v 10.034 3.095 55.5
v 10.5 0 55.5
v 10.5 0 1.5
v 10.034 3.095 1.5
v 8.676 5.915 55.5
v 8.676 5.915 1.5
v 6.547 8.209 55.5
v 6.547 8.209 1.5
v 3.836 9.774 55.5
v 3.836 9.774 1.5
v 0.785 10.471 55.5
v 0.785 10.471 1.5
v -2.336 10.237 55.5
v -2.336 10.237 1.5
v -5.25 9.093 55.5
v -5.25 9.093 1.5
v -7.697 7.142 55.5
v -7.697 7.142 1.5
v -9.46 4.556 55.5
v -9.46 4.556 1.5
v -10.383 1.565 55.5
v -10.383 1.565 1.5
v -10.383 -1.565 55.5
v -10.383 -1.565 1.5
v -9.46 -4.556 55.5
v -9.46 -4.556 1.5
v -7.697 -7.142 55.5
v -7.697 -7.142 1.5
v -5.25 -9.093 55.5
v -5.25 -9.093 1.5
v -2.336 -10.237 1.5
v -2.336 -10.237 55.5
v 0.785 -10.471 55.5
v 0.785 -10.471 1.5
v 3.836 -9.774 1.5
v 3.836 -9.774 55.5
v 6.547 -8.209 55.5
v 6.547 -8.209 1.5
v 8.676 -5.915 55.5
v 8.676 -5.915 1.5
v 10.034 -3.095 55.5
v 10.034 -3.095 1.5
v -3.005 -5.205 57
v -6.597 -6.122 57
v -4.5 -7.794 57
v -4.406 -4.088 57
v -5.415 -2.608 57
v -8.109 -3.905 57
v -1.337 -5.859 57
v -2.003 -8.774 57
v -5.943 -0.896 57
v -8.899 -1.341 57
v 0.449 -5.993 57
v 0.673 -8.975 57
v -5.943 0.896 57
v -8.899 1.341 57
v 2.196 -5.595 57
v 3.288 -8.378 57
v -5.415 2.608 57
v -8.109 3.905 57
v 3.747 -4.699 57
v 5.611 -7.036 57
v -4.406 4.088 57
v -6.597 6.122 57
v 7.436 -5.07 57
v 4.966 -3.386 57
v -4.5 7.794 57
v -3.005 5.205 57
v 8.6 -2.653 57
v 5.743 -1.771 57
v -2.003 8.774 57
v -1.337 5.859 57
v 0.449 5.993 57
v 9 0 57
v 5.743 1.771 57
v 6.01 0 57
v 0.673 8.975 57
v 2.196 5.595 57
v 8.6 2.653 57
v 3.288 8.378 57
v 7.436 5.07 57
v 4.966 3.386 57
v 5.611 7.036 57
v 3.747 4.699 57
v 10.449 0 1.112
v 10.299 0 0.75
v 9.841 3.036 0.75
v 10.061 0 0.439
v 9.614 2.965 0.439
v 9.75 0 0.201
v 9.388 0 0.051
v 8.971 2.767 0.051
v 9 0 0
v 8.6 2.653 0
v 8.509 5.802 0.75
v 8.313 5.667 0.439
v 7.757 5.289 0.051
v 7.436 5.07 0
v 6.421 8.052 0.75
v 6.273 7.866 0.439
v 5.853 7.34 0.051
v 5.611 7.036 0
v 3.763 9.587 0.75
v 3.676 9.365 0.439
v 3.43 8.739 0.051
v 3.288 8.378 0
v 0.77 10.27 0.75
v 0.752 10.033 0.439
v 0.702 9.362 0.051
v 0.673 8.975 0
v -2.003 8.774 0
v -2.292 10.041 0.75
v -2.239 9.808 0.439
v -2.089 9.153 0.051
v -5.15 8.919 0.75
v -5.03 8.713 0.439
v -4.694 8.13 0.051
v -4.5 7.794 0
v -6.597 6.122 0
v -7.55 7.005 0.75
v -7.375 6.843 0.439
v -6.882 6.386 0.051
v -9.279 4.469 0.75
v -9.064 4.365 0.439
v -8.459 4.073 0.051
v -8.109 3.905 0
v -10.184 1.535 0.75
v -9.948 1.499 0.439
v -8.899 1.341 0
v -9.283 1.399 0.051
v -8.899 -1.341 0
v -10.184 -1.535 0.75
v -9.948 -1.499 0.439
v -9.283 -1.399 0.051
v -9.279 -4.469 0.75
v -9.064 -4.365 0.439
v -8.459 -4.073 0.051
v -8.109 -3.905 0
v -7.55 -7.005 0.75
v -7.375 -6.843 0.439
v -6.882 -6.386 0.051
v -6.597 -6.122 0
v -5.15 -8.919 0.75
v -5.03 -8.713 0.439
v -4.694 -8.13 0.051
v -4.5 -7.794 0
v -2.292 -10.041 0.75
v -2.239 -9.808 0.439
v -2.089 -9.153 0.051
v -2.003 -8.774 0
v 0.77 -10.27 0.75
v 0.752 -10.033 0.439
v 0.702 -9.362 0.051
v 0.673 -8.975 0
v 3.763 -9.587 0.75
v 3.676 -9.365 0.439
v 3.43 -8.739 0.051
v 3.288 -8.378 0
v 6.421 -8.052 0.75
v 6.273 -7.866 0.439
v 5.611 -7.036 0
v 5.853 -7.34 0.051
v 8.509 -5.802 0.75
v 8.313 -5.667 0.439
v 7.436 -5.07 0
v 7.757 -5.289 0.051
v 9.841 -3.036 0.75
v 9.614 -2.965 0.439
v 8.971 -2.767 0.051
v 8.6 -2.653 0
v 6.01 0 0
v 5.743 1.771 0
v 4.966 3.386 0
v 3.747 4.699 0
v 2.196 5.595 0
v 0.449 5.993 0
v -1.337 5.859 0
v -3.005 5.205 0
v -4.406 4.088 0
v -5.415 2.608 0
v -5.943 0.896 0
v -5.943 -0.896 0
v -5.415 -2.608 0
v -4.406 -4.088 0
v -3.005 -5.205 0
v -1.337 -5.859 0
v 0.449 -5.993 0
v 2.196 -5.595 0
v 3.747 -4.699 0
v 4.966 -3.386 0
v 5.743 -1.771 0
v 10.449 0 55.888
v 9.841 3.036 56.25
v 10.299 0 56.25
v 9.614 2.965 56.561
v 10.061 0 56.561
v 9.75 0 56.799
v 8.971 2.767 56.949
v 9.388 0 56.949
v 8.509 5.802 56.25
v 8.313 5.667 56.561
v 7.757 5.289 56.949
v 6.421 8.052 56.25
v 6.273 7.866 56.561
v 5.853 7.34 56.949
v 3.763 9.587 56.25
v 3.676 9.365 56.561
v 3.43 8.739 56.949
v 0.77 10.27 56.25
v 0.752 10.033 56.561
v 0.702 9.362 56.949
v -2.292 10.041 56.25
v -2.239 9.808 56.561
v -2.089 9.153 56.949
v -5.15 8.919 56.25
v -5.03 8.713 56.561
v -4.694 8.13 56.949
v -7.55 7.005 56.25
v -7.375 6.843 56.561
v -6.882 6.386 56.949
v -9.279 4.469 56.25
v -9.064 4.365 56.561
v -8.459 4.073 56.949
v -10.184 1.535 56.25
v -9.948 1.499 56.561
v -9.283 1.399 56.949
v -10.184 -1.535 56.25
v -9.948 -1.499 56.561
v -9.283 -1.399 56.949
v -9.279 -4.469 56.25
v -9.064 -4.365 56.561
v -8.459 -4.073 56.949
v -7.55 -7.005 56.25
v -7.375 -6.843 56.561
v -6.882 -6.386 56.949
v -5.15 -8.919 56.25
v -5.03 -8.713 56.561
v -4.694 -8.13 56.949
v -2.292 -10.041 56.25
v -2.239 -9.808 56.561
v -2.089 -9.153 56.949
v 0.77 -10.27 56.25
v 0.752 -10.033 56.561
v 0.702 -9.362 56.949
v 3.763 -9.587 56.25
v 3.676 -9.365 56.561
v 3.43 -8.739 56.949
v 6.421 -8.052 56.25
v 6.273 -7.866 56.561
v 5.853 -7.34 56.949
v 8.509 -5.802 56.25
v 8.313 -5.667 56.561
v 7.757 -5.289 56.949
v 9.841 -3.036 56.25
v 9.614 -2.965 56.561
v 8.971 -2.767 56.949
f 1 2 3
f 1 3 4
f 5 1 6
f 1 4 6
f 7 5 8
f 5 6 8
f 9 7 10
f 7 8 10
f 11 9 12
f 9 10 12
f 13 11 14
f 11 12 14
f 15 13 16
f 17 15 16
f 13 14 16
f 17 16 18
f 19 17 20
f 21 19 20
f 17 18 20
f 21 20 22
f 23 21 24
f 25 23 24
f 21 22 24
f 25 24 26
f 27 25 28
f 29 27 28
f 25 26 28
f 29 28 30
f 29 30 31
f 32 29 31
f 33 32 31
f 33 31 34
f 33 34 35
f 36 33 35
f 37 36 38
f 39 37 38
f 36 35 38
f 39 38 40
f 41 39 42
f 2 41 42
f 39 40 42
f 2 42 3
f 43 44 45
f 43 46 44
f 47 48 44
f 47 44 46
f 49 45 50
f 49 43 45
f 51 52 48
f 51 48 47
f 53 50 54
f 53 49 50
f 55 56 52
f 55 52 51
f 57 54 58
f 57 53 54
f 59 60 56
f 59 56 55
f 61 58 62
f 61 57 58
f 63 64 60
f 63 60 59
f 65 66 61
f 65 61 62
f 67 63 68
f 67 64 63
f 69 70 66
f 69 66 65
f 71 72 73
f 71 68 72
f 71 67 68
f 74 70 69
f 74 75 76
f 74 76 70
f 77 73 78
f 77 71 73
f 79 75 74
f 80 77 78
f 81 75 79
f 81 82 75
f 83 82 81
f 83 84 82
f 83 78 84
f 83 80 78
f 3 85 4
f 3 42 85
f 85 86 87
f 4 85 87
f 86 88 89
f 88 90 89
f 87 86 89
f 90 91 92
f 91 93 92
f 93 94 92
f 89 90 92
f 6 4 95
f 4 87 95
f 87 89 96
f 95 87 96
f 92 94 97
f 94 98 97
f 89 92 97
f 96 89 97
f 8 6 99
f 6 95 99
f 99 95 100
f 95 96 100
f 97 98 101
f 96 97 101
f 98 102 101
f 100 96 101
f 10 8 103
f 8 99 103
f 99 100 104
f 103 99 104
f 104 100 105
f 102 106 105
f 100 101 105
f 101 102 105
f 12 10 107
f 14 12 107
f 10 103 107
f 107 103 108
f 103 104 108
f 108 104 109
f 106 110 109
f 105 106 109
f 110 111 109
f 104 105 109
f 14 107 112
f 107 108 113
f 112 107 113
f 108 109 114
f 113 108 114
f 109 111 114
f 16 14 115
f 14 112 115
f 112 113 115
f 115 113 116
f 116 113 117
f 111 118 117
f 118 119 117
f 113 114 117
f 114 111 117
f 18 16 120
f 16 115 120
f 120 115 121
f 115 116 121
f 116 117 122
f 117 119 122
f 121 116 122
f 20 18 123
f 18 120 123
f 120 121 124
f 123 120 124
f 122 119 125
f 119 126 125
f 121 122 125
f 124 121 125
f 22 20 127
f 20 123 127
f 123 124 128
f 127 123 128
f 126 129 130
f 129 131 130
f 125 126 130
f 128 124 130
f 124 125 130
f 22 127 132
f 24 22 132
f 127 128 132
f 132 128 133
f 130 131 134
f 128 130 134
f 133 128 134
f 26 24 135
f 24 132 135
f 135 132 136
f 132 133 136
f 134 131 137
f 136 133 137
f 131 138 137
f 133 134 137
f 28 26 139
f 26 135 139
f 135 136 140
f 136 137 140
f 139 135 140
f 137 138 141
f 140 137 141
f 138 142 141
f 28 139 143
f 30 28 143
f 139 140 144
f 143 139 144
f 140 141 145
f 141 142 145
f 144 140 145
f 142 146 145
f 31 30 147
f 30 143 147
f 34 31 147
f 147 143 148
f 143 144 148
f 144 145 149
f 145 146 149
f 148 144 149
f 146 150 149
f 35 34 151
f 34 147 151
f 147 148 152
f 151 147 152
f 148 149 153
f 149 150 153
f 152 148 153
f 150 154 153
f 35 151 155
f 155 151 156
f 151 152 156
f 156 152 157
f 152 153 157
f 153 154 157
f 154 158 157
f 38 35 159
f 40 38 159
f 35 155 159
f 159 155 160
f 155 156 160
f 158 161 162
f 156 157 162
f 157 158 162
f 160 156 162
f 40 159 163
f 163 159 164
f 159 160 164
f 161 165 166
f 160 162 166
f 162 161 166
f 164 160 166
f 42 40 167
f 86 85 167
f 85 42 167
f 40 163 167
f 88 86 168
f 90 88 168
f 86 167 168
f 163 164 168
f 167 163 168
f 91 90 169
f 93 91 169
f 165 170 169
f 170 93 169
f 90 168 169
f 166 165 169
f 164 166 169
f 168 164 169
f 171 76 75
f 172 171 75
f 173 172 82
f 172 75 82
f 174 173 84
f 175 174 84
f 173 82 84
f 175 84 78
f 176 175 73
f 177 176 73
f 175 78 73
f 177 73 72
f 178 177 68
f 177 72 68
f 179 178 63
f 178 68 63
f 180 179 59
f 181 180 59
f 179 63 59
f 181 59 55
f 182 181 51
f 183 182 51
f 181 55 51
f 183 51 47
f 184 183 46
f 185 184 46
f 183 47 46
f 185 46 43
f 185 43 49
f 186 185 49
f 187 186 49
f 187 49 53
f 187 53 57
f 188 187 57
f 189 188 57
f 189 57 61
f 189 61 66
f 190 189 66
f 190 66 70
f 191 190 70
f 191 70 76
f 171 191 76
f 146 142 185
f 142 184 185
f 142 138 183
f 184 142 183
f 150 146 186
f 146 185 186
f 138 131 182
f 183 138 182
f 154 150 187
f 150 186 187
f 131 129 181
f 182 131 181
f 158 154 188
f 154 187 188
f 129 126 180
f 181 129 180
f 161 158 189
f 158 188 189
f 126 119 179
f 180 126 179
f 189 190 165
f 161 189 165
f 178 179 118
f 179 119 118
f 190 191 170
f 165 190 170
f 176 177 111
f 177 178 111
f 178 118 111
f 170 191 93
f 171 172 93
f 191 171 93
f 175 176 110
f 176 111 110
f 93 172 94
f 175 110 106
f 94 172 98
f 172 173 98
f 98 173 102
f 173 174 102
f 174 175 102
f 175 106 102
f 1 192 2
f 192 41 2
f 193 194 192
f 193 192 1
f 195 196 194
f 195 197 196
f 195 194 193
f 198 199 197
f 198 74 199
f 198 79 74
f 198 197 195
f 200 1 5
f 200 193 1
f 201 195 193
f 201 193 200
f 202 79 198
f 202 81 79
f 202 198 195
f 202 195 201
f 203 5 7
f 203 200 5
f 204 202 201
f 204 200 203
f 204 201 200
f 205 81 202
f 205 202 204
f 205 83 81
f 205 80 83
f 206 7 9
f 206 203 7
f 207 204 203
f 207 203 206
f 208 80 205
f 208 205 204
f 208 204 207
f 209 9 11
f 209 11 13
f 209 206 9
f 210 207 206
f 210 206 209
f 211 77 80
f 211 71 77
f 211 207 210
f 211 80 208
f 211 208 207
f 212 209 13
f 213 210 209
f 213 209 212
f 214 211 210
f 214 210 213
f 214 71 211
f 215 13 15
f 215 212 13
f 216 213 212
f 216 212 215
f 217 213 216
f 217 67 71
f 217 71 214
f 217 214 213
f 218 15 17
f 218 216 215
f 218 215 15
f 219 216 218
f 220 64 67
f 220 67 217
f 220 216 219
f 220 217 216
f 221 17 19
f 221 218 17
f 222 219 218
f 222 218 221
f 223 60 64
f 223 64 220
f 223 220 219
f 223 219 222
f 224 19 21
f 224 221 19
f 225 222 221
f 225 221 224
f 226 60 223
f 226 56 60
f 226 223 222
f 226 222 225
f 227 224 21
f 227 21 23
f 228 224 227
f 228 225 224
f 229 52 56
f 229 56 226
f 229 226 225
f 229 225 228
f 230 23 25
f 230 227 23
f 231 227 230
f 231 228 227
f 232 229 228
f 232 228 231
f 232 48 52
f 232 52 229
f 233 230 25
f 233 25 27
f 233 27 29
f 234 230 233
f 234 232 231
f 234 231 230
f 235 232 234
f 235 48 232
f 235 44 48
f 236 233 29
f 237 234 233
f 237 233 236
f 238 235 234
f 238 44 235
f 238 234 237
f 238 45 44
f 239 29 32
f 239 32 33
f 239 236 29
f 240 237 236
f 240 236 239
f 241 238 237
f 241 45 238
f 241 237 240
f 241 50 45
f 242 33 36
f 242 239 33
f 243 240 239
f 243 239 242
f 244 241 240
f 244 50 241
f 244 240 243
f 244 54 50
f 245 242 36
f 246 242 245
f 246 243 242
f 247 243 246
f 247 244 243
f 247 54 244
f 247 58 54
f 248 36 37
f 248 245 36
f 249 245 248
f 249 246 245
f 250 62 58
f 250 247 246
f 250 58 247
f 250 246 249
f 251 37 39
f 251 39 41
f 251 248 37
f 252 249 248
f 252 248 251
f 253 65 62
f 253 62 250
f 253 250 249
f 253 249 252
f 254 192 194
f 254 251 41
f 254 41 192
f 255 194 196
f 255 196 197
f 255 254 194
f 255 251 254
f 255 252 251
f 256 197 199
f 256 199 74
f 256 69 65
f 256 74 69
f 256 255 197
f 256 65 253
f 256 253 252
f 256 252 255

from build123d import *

# Parameters (mm, degrees)
F0_R     = 10.5
F1_DEPTH = 57
F2_R     = 6.01
F3_DEPTH = 57.001
F4_R     = 1.5


with BuildPart() as f1:
    # F0 (on Top) → F1 (new body)
    with BuildSketch(Plane.XY):
        Circle(F0_R)
    extrude(amount=F1_DEPTH)

    # F2 (on face) → F3 (cut, through all)
    with BuildSketch(Plane.XY.offset(57)):
        Circle(F2_R)
    extrude(amount=-F3_DEPTH, mode=Mode.SUBTRACT)

    # F4
    f4_edges = [f1.edges().sort_by_distance(p)[0] for p in [
        (-10.5, 0, 57),
        (-10.5, 0, 0),
    ]]
    fillet(f4_edges, radius=F4_R)


solid = f1.part
